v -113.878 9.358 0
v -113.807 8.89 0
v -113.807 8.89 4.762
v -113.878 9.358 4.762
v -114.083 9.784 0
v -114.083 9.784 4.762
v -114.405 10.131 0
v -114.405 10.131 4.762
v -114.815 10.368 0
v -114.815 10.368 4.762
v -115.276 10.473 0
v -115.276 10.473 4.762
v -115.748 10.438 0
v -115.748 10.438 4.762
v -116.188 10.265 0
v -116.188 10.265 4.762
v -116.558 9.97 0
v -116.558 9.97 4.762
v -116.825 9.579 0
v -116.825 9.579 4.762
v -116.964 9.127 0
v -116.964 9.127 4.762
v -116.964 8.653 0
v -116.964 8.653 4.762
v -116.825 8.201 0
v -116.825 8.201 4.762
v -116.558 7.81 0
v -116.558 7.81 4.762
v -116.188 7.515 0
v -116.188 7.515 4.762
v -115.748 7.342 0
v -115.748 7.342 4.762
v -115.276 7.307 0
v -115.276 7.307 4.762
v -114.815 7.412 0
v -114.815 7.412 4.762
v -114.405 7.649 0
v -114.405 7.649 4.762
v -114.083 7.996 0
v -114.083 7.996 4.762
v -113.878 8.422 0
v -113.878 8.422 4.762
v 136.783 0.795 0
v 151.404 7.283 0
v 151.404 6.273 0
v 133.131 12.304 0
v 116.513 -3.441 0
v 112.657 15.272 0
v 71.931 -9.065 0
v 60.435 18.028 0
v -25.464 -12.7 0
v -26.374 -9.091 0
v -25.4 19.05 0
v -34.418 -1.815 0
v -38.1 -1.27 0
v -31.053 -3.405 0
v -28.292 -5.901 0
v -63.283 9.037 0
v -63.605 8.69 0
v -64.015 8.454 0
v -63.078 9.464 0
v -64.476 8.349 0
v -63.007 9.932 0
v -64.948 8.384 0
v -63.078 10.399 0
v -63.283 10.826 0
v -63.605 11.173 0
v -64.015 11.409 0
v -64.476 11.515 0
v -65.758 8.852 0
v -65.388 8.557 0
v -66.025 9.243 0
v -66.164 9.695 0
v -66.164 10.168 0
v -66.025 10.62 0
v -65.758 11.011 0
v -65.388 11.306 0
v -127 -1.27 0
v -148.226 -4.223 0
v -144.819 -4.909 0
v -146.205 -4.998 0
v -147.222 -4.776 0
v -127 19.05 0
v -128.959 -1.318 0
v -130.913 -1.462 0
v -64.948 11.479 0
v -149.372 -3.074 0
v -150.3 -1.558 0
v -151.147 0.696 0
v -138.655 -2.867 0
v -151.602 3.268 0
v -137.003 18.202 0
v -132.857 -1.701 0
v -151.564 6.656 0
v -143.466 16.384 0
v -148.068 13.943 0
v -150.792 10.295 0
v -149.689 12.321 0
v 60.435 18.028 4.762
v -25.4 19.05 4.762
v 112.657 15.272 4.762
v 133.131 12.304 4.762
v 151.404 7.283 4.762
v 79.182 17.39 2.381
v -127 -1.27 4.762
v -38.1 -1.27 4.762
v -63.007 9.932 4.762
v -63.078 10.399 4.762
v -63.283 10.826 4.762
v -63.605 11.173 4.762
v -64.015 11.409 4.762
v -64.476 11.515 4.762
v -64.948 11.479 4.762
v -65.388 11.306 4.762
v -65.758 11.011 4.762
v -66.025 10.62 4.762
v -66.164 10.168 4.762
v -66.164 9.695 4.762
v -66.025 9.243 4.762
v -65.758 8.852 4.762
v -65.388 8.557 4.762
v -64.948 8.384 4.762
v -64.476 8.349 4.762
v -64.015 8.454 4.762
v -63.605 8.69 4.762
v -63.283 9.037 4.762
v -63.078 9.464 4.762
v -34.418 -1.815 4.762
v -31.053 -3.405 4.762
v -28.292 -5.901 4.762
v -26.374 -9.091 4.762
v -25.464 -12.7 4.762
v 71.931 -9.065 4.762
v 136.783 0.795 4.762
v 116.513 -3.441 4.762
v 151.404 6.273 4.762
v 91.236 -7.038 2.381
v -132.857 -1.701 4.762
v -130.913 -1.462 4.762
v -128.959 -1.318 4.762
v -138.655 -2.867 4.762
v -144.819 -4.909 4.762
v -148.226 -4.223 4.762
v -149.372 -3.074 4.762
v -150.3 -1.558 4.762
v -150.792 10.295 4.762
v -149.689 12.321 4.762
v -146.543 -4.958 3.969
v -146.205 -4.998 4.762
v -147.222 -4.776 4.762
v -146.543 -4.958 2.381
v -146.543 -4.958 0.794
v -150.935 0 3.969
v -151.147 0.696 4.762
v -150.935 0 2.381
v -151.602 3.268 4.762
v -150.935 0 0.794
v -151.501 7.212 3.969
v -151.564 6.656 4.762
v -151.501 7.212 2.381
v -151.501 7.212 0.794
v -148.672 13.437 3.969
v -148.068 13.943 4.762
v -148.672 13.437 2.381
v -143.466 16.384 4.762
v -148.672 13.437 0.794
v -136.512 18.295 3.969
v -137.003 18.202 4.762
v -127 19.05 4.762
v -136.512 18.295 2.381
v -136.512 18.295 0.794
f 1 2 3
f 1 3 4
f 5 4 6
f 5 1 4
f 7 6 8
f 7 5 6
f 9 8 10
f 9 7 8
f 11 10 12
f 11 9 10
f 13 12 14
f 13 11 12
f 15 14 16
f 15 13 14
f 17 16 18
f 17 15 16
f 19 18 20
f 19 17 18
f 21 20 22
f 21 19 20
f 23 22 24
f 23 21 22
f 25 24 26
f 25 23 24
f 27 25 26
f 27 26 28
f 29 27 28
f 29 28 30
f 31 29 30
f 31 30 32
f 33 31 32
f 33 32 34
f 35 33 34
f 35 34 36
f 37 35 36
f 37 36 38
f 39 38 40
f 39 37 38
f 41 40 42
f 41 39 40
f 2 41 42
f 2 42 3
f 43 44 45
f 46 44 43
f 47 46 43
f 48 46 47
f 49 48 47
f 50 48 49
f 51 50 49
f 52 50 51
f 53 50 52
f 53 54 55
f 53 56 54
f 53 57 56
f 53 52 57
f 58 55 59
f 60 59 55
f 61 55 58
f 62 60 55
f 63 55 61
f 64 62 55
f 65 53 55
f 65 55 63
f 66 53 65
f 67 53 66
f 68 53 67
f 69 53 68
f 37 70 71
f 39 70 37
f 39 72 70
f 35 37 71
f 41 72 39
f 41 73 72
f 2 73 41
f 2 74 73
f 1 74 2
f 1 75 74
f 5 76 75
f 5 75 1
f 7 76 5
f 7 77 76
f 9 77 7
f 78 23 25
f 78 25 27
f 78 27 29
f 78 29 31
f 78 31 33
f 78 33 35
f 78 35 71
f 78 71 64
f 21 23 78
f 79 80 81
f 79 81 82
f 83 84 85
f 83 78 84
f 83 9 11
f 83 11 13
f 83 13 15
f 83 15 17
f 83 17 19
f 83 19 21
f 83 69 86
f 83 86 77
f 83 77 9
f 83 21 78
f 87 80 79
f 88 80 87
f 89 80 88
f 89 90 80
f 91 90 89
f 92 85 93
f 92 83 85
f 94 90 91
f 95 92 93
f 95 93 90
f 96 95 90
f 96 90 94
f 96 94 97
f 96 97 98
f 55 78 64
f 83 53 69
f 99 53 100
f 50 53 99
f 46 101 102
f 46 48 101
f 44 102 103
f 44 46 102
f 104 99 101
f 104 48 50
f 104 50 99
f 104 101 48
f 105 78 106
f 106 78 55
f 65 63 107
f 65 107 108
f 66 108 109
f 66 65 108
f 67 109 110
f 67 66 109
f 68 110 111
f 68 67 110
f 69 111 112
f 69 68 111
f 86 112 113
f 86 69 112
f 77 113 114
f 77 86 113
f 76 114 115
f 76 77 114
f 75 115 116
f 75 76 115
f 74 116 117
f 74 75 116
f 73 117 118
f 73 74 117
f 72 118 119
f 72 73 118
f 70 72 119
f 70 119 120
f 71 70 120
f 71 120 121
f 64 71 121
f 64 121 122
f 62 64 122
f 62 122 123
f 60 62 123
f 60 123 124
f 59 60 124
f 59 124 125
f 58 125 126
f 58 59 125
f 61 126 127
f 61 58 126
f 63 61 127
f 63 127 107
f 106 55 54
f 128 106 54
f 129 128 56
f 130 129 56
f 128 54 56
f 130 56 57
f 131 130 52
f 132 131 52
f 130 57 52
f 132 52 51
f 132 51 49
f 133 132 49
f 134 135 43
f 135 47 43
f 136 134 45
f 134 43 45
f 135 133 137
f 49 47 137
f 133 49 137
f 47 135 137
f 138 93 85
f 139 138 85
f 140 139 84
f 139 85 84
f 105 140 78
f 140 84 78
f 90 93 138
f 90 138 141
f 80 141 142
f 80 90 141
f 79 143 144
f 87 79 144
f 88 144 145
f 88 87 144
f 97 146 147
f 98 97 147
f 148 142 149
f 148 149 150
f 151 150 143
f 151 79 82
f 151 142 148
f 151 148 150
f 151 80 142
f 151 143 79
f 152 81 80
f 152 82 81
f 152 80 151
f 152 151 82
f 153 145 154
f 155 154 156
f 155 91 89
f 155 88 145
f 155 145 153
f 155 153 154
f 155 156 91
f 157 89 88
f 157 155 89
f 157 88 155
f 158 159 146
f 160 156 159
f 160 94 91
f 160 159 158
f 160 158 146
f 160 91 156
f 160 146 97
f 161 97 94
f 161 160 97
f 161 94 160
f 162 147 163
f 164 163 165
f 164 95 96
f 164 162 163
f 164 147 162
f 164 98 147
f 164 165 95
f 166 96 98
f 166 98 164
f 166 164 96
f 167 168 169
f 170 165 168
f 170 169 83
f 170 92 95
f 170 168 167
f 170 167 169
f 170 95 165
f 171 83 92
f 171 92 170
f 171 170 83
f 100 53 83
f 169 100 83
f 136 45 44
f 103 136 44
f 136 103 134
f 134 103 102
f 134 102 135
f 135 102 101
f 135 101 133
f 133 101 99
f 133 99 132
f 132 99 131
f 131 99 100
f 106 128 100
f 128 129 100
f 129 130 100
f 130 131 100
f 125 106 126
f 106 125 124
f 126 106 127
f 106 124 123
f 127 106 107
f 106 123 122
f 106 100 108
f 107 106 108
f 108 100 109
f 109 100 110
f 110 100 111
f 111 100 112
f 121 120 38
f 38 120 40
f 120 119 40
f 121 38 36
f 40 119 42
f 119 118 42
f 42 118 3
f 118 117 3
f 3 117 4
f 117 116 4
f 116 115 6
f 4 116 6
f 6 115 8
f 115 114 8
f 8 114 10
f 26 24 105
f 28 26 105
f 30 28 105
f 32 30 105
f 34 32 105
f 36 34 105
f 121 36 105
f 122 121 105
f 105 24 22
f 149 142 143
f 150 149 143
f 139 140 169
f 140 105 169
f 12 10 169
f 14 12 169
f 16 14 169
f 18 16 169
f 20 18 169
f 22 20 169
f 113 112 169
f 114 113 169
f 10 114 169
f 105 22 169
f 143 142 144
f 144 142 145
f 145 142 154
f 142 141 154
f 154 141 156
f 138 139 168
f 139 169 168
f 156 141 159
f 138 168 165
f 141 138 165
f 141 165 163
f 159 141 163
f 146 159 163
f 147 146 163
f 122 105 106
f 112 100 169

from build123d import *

# Parameters (mm, degrees)
F0_R     = 1.5875
F1_DEPTH = 4.7625


with BuildPart() as f1:
    # F0 (on Top) → F1 (new body)
    with BuildSketch(Plane.XY):
        with BuildLine():
            add(Edge.make_bspline(
                [(-25.4000339955, 19.0499999844), (11.0659803484, 19.0499999844), (75.6404907204, 18.3951374474), (131.6233865179, 14.5919578775), (151.4037655455, 7.2832109724)],
                knots=[0, 0, 0, 0, 0.5432073477, 0.9924282823, 0.9924282823, 0.9924282823, 0.9924282823], degree=3))
            Line((-25.4000339955, 19.0499999844), (-127, 19.0499999844))
            add(Edge.make_bspline(
                [(-132.8572214313, -1.7011073168), (-138.7224568365, -1.9098253759), (-146.5869393979, -7.9306938244), (-151.6875511275, 0.0750696788), (-151.8479933658, 7.2472530677), (-149.7515385788, 14.6964316511), (-136.3808090157, 18.8981087489), (-129.8206844988, 19.0301054596), (-127, 19.0499999844)],
                knots=[0, 0, 0, 0, 0.2045504807, 0.3449061653, 0.4915899731, 0.6341965753, 0.8315420062, 1, 1, 1, 1], degree=3))
            ThreePointArc((-132.8572214313, -1.7011073168), (-129.9365326669, -1.3779224016), (-127, -1.27))
            Line((-127, -1.27), (-38.1, -1.27))
            ThreePointArc((-38.1, -1.27), (-29.5805810057, -4.5514279214), (-25.4636595487, -12.7))
            add(Edge.make_bspline(
                [(-25.4636595487, -12.7), (48.6882164823, -10.6703078891), (71.671615255, -10.5113328002), (140.4678429521, -0.2739958712), (151.4037655455, 6.2728745575)],
                knots=[0, 0, 0, 0, 0.5771160301, 0.986879266, 0.986879266, 0.986879266, 0.986879266], degree=3))
            Line((151.4037655455, 6.2728745575), (151.4037655455, 7.2832109724))
        make_face()
        with Locations((-115.3946487784, 8.8899999844)):
            Circle(F0_R, mode=Mode.SUBTRACT)
        with Locations((-64.5946487784, 9.931572713)):
            Circle(F0_R, mode=Mode.SUBTRACT)
    extrude(amount=F1_DEPTH)


solid = f1.part
